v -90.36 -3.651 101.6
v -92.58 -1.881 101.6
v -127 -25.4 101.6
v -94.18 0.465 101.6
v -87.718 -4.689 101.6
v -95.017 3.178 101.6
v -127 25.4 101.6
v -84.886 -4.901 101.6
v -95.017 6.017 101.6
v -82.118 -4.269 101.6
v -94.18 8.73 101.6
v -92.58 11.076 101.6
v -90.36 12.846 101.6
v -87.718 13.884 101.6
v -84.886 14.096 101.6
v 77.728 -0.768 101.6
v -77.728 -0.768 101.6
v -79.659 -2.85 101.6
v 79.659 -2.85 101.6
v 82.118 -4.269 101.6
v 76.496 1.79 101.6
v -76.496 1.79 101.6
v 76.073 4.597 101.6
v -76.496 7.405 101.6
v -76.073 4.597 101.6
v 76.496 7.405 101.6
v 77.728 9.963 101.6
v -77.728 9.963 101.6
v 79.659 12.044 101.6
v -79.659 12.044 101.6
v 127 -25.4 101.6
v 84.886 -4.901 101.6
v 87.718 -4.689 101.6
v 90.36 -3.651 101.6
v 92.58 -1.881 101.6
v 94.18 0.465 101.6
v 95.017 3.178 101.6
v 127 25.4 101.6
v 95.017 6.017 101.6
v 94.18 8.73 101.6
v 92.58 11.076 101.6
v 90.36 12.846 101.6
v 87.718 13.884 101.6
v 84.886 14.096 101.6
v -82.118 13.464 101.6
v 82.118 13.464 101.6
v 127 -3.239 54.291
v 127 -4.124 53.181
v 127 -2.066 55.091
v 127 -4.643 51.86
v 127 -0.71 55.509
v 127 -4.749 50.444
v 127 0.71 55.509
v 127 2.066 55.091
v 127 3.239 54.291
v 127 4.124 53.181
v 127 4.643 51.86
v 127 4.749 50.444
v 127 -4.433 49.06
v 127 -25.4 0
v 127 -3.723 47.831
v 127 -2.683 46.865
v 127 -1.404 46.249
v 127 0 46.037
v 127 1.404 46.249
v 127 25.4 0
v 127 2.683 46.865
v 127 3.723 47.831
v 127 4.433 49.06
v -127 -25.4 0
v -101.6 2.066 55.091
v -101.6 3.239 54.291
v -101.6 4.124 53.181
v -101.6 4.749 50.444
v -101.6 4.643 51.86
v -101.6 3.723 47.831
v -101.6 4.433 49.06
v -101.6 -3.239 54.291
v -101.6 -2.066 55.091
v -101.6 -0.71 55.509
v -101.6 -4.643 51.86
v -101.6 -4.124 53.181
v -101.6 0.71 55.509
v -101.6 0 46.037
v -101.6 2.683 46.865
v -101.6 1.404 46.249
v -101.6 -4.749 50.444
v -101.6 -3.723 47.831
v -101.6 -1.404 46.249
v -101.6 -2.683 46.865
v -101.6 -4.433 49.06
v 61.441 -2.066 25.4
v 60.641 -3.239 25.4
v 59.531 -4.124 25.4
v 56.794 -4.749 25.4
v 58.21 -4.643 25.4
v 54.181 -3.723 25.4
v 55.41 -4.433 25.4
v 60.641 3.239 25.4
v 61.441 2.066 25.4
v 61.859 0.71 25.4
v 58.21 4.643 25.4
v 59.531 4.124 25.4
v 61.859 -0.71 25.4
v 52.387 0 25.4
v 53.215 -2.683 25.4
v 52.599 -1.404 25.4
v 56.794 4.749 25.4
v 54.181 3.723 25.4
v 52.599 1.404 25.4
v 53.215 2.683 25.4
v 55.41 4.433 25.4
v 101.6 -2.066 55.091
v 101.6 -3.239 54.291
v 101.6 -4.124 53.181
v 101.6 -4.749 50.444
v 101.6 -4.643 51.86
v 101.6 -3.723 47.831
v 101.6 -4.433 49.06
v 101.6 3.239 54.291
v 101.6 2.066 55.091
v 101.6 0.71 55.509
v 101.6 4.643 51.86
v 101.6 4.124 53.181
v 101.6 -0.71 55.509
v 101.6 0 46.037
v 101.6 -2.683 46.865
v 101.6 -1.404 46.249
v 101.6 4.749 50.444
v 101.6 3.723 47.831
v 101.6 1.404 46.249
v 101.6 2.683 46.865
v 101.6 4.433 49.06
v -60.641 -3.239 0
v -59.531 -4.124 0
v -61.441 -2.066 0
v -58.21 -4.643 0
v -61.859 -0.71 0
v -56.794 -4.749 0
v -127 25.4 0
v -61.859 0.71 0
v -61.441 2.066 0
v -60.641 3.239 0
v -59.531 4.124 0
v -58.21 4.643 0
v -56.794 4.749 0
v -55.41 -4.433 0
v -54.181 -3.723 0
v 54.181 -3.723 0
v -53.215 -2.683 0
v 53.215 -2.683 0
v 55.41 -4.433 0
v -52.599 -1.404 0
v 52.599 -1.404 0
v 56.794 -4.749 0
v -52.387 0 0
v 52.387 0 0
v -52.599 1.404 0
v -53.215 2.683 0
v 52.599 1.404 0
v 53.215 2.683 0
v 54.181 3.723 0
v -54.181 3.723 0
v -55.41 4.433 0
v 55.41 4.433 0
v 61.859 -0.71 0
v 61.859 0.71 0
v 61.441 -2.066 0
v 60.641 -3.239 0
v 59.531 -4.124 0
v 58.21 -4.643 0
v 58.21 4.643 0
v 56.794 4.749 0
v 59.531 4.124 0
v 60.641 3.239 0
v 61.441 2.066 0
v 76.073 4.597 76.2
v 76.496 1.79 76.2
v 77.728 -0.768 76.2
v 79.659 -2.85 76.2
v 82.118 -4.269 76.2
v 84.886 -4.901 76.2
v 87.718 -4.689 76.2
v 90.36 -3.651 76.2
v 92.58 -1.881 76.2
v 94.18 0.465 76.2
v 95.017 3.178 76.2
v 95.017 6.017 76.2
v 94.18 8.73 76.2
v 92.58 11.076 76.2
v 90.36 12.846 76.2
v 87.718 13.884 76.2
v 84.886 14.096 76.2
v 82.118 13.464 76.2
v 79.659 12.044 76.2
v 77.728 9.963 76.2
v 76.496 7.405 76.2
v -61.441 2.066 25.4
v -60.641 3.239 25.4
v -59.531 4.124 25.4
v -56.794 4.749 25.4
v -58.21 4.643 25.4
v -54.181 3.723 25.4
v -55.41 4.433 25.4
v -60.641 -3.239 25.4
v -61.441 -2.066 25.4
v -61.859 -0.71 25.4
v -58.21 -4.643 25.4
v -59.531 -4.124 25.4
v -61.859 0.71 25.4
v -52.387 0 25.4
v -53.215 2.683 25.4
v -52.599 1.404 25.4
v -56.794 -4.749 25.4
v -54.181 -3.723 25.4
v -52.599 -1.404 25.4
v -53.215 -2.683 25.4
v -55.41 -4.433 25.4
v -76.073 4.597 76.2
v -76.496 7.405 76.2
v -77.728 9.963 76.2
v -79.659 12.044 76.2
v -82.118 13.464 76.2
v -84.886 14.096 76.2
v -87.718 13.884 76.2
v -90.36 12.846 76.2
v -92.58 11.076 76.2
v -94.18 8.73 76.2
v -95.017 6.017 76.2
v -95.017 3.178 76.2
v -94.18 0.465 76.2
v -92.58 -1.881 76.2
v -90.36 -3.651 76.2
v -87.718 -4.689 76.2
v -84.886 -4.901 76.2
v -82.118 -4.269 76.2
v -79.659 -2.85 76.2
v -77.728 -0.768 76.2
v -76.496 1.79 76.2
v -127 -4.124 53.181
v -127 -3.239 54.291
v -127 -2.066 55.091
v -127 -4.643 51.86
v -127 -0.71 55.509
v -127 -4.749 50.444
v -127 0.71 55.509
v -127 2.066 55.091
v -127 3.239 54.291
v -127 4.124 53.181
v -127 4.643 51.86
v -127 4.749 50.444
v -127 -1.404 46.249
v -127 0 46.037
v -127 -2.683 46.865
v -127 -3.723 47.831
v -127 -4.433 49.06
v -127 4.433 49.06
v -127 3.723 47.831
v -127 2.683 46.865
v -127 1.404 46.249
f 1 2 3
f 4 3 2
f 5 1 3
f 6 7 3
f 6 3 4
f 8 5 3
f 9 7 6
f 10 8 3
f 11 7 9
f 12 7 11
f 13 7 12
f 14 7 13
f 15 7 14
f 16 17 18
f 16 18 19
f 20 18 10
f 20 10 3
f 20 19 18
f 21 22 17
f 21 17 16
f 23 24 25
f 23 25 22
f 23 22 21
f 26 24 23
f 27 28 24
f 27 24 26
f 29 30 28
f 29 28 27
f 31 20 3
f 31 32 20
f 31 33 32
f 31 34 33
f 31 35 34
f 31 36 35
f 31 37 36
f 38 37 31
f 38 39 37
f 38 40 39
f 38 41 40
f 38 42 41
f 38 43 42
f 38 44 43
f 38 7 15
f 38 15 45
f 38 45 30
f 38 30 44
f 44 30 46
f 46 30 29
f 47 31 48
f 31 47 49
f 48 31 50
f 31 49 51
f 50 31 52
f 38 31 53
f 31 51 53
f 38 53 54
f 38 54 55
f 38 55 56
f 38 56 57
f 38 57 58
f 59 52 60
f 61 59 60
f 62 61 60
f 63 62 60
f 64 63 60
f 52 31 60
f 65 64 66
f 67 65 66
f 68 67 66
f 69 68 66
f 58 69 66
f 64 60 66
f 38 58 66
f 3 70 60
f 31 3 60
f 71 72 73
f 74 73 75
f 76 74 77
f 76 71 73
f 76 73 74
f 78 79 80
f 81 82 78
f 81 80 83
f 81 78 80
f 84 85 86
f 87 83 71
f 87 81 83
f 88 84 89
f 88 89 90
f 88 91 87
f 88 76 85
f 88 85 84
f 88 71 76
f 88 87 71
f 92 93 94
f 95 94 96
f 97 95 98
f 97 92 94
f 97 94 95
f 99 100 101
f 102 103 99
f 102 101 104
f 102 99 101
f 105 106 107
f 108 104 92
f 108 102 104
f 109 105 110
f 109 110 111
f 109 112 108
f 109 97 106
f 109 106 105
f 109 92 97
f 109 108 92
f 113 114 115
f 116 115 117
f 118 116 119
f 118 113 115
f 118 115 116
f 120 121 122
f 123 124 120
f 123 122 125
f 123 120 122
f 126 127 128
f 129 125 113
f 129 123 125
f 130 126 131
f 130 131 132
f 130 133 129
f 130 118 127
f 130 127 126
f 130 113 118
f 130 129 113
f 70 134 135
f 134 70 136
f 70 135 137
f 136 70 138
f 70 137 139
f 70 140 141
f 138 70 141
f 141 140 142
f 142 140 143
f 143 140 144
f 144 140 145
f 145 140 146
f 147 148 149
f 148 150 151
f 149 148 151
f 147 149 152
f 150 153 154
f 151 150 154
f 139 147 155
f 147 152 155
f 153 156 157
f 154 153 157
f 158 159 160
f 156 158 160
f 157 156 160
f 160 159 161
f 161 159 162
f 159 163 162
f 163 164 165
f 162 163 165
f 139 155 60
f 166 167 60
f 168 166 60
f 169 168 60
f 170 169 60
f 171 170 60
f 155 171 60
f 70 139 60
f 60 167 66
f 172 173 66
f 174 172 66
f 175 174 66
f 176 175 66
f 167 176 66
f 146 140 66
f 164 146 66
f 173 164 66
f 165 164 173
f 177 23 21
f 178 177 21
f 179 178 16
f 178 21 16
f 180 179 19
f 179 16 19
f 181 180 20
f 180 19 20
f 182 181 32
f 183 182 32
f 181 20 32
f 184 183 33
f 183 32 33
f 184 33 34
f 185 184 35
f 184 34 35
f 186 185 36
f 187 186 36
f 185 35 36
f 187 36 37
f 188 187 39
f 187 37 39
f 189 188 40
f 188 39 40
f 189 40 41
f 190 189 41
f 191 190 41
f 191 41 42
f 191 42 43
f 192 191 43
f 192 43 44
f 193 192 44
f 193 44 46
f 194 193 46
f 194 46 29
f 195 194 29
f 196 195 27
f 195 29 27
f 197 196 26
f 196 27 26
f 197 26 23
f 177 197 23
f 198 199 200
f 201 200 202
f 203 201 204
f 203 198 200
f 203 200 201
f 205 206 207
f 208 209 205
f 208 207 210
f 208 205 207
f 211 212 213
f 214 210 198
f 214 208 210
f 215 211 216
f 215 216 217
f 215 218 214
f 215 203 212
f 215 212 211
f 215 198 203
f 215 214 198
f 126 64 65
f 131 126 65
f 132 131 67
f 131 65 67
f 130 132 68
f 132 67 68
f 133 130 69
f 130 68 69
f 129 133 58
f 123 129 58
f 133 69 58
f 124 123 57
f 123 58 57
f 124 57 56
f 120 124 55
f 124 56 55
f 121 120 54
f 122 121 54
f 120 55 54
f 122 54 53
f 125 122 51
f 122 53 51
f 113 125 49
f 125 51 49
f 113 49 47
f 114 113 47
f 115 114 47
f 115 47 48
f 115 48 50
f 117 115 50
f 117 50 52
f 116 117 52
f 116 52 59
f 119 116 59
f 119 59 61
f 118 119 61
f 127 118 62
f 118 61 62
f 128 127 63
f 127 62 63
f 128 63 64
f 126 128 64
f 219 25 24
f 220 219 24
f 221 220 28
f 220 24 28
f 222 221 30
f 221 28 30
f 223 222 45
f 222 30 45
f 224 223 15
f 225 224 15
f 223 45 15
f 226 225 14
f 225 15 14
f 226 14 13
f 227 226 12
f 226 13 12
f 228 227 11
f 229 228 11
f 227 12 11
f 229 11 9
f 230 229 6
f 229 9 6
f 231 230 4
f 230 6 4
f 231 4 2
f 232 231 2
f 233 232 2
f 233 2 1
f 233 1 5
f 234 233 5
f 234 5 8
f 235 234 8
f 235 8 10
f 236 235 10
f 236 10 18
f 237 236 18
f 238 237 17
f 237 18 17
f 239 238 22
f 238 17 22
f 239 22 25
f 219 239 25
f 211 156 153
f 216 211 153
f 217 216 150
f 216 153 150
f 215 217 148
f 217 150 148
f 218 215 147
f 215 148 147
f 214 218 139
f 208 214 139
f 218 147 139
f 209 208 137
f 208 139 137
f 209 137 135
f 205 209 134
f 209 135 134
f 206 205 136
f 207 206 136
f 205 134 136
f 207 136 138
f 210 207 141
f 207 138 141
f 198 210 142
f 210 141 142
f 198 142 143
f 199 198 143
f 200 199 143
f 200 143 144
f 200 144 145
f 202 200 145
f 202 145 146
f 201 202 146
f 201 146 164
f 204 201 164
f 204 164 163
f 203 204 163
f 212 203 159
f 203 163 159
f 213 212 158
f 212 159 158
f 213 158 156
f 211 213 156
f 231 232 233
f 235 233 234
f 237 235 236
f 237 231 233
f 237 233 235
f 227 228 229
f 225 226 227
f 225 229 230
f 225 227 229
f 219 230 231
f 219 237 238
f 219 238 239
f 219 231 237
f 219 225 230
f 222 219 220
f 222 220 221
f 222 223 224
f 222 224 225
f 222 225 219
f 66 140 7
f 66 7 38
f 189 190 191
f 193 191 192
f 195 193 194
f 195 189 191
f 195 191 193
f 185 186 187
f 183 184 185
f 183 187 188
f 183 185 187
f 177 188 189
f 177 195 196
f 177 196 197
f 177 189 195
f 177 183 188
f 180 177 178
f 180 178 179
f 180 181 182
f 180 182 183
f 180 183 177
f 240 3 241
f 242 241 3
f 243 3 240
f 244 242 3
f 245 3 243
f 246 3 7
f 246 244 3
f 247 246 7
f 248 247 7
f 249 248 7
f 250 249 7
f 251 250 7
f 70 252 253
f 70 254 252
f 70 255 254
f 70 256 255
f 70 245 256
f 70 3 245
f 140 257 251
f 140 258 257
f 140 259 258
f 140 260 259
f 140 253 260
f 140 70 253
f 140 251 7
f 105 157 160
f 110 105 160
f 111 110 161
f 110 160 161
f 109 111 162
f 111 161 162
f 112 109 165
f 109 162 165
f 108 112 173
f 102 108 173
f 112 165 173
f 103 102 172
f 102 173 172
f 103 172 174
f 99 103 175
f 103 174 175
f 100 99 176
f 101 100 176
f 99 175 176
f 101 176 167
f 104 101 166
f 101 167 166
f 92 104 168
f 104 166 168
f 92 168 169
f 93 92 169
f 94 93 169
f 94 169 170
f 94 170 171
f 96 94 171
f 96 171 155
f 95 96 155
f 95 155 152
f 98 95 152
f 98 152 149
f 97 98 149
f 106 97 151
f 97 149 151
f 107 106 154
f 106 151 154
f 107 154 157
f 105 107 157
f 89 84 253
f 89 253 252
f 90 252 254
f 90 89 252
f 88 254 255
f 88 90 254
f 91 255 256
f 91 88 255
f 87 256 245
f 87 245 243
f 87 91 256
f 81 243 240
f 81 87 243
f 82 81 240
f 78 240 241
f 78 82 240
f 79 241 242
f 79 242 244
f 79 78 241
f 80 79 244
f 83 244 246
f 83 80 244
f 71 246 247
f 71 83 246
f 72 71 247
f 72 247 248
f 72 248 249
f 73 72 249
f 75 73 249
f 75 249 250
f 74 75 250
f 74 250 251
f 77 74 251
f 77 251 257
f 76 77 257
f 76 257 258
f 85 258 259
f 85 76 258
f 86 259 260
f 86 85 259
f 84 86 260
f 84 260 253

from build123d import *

# Parameters (mm, degrees)
SKETCH1_W           = 254
SKETCH1_H           = 50.8
BOSS_EXTRUDE1_DEPTH = 101.6
SKETCH2_R           = 9.525
CUT_EXTRUDE1_DEPTH  = 25.4
SKETCH3_R           = 4.7625
CUT_EXTRUDE2_DEPTH  = 25.4
SKETCH4_R           = 4.7625
CUT_EXTRUDE3_DEPTH  = 25.4
CUT_EXTRUDE4_START  = -25.4
SKETCH5_R           = 4.7625
CUT_EXTRUDE4_DEPTH  = 25.4


with BuildPart() as part:
    # Sketch1 → Boss-Extrude1 (new body)
    with BuildSketch(Plane.XY):
        Rectangle(SKETCH1_W, SKETCH1_H)
    extrude(amount=BOSS_EXTRUDE1_DEPTH)

    # Sketch2 → Cut-Extrude1 (cut)
    with BuildSketch(Plane.XY.offset(101.6)):
        with Locations((-85.598, 4.5974)):
            Circle(SKETCH2_R)
        with Locations(Location((85.598, 4.5974, 0), (0, 0, 180))):
            Circle(SKETCH2_R)
    extrude(amount=-CUT_EXTRUDE1_DEPTH, mode=Mode.SUBTRACT)

    # Sketch3 → Cut-Extrude2 (cut)
    with BuildSketch(Plane(origin=(0, 0, 0), x_dir=(-1, 0, 0), z_dir=(0, 0, -1))):
        with Locations((-57.15, 0)):
            Circle(SKETCH3_R)
        with Locations(Location((57.15, 0, 0), (0, 0, 180))):
            Circle(SKETCH3_R)
    extrude(amount=-CUT_EXTRUDE2_DEPTH, mode=Mode.SUBTRACT)

    # Sketch4 → Cut-Extrude3 (cut)
    with BuildSketch(Plane(origin=(127, 0, 0), x_dir=(0, 0, -1), z_dir=(1, 0, 0))):
        with Locations((-50.8, 0)):
            Circle(SKETCH4_R)
    extrude(amount=-CUT_EXTRUDE3_DEPTH, mode=Mode.SUBTRACT)

    # Sketch5 → Cut-Extrude4 (cut)
    with BuildSketch(Plane.ZY.offset(127).offset(CUT_EXTRUDE4_START)):
        with Locations(Location((50.8, 0, 0), (0, 0, 180))):
            Circle(SKETCH5_R)
    extrude(amount=CUT_EXTRUDE4_DEPTH, mode=Mode.SUBTRACT)


solid = part.part
